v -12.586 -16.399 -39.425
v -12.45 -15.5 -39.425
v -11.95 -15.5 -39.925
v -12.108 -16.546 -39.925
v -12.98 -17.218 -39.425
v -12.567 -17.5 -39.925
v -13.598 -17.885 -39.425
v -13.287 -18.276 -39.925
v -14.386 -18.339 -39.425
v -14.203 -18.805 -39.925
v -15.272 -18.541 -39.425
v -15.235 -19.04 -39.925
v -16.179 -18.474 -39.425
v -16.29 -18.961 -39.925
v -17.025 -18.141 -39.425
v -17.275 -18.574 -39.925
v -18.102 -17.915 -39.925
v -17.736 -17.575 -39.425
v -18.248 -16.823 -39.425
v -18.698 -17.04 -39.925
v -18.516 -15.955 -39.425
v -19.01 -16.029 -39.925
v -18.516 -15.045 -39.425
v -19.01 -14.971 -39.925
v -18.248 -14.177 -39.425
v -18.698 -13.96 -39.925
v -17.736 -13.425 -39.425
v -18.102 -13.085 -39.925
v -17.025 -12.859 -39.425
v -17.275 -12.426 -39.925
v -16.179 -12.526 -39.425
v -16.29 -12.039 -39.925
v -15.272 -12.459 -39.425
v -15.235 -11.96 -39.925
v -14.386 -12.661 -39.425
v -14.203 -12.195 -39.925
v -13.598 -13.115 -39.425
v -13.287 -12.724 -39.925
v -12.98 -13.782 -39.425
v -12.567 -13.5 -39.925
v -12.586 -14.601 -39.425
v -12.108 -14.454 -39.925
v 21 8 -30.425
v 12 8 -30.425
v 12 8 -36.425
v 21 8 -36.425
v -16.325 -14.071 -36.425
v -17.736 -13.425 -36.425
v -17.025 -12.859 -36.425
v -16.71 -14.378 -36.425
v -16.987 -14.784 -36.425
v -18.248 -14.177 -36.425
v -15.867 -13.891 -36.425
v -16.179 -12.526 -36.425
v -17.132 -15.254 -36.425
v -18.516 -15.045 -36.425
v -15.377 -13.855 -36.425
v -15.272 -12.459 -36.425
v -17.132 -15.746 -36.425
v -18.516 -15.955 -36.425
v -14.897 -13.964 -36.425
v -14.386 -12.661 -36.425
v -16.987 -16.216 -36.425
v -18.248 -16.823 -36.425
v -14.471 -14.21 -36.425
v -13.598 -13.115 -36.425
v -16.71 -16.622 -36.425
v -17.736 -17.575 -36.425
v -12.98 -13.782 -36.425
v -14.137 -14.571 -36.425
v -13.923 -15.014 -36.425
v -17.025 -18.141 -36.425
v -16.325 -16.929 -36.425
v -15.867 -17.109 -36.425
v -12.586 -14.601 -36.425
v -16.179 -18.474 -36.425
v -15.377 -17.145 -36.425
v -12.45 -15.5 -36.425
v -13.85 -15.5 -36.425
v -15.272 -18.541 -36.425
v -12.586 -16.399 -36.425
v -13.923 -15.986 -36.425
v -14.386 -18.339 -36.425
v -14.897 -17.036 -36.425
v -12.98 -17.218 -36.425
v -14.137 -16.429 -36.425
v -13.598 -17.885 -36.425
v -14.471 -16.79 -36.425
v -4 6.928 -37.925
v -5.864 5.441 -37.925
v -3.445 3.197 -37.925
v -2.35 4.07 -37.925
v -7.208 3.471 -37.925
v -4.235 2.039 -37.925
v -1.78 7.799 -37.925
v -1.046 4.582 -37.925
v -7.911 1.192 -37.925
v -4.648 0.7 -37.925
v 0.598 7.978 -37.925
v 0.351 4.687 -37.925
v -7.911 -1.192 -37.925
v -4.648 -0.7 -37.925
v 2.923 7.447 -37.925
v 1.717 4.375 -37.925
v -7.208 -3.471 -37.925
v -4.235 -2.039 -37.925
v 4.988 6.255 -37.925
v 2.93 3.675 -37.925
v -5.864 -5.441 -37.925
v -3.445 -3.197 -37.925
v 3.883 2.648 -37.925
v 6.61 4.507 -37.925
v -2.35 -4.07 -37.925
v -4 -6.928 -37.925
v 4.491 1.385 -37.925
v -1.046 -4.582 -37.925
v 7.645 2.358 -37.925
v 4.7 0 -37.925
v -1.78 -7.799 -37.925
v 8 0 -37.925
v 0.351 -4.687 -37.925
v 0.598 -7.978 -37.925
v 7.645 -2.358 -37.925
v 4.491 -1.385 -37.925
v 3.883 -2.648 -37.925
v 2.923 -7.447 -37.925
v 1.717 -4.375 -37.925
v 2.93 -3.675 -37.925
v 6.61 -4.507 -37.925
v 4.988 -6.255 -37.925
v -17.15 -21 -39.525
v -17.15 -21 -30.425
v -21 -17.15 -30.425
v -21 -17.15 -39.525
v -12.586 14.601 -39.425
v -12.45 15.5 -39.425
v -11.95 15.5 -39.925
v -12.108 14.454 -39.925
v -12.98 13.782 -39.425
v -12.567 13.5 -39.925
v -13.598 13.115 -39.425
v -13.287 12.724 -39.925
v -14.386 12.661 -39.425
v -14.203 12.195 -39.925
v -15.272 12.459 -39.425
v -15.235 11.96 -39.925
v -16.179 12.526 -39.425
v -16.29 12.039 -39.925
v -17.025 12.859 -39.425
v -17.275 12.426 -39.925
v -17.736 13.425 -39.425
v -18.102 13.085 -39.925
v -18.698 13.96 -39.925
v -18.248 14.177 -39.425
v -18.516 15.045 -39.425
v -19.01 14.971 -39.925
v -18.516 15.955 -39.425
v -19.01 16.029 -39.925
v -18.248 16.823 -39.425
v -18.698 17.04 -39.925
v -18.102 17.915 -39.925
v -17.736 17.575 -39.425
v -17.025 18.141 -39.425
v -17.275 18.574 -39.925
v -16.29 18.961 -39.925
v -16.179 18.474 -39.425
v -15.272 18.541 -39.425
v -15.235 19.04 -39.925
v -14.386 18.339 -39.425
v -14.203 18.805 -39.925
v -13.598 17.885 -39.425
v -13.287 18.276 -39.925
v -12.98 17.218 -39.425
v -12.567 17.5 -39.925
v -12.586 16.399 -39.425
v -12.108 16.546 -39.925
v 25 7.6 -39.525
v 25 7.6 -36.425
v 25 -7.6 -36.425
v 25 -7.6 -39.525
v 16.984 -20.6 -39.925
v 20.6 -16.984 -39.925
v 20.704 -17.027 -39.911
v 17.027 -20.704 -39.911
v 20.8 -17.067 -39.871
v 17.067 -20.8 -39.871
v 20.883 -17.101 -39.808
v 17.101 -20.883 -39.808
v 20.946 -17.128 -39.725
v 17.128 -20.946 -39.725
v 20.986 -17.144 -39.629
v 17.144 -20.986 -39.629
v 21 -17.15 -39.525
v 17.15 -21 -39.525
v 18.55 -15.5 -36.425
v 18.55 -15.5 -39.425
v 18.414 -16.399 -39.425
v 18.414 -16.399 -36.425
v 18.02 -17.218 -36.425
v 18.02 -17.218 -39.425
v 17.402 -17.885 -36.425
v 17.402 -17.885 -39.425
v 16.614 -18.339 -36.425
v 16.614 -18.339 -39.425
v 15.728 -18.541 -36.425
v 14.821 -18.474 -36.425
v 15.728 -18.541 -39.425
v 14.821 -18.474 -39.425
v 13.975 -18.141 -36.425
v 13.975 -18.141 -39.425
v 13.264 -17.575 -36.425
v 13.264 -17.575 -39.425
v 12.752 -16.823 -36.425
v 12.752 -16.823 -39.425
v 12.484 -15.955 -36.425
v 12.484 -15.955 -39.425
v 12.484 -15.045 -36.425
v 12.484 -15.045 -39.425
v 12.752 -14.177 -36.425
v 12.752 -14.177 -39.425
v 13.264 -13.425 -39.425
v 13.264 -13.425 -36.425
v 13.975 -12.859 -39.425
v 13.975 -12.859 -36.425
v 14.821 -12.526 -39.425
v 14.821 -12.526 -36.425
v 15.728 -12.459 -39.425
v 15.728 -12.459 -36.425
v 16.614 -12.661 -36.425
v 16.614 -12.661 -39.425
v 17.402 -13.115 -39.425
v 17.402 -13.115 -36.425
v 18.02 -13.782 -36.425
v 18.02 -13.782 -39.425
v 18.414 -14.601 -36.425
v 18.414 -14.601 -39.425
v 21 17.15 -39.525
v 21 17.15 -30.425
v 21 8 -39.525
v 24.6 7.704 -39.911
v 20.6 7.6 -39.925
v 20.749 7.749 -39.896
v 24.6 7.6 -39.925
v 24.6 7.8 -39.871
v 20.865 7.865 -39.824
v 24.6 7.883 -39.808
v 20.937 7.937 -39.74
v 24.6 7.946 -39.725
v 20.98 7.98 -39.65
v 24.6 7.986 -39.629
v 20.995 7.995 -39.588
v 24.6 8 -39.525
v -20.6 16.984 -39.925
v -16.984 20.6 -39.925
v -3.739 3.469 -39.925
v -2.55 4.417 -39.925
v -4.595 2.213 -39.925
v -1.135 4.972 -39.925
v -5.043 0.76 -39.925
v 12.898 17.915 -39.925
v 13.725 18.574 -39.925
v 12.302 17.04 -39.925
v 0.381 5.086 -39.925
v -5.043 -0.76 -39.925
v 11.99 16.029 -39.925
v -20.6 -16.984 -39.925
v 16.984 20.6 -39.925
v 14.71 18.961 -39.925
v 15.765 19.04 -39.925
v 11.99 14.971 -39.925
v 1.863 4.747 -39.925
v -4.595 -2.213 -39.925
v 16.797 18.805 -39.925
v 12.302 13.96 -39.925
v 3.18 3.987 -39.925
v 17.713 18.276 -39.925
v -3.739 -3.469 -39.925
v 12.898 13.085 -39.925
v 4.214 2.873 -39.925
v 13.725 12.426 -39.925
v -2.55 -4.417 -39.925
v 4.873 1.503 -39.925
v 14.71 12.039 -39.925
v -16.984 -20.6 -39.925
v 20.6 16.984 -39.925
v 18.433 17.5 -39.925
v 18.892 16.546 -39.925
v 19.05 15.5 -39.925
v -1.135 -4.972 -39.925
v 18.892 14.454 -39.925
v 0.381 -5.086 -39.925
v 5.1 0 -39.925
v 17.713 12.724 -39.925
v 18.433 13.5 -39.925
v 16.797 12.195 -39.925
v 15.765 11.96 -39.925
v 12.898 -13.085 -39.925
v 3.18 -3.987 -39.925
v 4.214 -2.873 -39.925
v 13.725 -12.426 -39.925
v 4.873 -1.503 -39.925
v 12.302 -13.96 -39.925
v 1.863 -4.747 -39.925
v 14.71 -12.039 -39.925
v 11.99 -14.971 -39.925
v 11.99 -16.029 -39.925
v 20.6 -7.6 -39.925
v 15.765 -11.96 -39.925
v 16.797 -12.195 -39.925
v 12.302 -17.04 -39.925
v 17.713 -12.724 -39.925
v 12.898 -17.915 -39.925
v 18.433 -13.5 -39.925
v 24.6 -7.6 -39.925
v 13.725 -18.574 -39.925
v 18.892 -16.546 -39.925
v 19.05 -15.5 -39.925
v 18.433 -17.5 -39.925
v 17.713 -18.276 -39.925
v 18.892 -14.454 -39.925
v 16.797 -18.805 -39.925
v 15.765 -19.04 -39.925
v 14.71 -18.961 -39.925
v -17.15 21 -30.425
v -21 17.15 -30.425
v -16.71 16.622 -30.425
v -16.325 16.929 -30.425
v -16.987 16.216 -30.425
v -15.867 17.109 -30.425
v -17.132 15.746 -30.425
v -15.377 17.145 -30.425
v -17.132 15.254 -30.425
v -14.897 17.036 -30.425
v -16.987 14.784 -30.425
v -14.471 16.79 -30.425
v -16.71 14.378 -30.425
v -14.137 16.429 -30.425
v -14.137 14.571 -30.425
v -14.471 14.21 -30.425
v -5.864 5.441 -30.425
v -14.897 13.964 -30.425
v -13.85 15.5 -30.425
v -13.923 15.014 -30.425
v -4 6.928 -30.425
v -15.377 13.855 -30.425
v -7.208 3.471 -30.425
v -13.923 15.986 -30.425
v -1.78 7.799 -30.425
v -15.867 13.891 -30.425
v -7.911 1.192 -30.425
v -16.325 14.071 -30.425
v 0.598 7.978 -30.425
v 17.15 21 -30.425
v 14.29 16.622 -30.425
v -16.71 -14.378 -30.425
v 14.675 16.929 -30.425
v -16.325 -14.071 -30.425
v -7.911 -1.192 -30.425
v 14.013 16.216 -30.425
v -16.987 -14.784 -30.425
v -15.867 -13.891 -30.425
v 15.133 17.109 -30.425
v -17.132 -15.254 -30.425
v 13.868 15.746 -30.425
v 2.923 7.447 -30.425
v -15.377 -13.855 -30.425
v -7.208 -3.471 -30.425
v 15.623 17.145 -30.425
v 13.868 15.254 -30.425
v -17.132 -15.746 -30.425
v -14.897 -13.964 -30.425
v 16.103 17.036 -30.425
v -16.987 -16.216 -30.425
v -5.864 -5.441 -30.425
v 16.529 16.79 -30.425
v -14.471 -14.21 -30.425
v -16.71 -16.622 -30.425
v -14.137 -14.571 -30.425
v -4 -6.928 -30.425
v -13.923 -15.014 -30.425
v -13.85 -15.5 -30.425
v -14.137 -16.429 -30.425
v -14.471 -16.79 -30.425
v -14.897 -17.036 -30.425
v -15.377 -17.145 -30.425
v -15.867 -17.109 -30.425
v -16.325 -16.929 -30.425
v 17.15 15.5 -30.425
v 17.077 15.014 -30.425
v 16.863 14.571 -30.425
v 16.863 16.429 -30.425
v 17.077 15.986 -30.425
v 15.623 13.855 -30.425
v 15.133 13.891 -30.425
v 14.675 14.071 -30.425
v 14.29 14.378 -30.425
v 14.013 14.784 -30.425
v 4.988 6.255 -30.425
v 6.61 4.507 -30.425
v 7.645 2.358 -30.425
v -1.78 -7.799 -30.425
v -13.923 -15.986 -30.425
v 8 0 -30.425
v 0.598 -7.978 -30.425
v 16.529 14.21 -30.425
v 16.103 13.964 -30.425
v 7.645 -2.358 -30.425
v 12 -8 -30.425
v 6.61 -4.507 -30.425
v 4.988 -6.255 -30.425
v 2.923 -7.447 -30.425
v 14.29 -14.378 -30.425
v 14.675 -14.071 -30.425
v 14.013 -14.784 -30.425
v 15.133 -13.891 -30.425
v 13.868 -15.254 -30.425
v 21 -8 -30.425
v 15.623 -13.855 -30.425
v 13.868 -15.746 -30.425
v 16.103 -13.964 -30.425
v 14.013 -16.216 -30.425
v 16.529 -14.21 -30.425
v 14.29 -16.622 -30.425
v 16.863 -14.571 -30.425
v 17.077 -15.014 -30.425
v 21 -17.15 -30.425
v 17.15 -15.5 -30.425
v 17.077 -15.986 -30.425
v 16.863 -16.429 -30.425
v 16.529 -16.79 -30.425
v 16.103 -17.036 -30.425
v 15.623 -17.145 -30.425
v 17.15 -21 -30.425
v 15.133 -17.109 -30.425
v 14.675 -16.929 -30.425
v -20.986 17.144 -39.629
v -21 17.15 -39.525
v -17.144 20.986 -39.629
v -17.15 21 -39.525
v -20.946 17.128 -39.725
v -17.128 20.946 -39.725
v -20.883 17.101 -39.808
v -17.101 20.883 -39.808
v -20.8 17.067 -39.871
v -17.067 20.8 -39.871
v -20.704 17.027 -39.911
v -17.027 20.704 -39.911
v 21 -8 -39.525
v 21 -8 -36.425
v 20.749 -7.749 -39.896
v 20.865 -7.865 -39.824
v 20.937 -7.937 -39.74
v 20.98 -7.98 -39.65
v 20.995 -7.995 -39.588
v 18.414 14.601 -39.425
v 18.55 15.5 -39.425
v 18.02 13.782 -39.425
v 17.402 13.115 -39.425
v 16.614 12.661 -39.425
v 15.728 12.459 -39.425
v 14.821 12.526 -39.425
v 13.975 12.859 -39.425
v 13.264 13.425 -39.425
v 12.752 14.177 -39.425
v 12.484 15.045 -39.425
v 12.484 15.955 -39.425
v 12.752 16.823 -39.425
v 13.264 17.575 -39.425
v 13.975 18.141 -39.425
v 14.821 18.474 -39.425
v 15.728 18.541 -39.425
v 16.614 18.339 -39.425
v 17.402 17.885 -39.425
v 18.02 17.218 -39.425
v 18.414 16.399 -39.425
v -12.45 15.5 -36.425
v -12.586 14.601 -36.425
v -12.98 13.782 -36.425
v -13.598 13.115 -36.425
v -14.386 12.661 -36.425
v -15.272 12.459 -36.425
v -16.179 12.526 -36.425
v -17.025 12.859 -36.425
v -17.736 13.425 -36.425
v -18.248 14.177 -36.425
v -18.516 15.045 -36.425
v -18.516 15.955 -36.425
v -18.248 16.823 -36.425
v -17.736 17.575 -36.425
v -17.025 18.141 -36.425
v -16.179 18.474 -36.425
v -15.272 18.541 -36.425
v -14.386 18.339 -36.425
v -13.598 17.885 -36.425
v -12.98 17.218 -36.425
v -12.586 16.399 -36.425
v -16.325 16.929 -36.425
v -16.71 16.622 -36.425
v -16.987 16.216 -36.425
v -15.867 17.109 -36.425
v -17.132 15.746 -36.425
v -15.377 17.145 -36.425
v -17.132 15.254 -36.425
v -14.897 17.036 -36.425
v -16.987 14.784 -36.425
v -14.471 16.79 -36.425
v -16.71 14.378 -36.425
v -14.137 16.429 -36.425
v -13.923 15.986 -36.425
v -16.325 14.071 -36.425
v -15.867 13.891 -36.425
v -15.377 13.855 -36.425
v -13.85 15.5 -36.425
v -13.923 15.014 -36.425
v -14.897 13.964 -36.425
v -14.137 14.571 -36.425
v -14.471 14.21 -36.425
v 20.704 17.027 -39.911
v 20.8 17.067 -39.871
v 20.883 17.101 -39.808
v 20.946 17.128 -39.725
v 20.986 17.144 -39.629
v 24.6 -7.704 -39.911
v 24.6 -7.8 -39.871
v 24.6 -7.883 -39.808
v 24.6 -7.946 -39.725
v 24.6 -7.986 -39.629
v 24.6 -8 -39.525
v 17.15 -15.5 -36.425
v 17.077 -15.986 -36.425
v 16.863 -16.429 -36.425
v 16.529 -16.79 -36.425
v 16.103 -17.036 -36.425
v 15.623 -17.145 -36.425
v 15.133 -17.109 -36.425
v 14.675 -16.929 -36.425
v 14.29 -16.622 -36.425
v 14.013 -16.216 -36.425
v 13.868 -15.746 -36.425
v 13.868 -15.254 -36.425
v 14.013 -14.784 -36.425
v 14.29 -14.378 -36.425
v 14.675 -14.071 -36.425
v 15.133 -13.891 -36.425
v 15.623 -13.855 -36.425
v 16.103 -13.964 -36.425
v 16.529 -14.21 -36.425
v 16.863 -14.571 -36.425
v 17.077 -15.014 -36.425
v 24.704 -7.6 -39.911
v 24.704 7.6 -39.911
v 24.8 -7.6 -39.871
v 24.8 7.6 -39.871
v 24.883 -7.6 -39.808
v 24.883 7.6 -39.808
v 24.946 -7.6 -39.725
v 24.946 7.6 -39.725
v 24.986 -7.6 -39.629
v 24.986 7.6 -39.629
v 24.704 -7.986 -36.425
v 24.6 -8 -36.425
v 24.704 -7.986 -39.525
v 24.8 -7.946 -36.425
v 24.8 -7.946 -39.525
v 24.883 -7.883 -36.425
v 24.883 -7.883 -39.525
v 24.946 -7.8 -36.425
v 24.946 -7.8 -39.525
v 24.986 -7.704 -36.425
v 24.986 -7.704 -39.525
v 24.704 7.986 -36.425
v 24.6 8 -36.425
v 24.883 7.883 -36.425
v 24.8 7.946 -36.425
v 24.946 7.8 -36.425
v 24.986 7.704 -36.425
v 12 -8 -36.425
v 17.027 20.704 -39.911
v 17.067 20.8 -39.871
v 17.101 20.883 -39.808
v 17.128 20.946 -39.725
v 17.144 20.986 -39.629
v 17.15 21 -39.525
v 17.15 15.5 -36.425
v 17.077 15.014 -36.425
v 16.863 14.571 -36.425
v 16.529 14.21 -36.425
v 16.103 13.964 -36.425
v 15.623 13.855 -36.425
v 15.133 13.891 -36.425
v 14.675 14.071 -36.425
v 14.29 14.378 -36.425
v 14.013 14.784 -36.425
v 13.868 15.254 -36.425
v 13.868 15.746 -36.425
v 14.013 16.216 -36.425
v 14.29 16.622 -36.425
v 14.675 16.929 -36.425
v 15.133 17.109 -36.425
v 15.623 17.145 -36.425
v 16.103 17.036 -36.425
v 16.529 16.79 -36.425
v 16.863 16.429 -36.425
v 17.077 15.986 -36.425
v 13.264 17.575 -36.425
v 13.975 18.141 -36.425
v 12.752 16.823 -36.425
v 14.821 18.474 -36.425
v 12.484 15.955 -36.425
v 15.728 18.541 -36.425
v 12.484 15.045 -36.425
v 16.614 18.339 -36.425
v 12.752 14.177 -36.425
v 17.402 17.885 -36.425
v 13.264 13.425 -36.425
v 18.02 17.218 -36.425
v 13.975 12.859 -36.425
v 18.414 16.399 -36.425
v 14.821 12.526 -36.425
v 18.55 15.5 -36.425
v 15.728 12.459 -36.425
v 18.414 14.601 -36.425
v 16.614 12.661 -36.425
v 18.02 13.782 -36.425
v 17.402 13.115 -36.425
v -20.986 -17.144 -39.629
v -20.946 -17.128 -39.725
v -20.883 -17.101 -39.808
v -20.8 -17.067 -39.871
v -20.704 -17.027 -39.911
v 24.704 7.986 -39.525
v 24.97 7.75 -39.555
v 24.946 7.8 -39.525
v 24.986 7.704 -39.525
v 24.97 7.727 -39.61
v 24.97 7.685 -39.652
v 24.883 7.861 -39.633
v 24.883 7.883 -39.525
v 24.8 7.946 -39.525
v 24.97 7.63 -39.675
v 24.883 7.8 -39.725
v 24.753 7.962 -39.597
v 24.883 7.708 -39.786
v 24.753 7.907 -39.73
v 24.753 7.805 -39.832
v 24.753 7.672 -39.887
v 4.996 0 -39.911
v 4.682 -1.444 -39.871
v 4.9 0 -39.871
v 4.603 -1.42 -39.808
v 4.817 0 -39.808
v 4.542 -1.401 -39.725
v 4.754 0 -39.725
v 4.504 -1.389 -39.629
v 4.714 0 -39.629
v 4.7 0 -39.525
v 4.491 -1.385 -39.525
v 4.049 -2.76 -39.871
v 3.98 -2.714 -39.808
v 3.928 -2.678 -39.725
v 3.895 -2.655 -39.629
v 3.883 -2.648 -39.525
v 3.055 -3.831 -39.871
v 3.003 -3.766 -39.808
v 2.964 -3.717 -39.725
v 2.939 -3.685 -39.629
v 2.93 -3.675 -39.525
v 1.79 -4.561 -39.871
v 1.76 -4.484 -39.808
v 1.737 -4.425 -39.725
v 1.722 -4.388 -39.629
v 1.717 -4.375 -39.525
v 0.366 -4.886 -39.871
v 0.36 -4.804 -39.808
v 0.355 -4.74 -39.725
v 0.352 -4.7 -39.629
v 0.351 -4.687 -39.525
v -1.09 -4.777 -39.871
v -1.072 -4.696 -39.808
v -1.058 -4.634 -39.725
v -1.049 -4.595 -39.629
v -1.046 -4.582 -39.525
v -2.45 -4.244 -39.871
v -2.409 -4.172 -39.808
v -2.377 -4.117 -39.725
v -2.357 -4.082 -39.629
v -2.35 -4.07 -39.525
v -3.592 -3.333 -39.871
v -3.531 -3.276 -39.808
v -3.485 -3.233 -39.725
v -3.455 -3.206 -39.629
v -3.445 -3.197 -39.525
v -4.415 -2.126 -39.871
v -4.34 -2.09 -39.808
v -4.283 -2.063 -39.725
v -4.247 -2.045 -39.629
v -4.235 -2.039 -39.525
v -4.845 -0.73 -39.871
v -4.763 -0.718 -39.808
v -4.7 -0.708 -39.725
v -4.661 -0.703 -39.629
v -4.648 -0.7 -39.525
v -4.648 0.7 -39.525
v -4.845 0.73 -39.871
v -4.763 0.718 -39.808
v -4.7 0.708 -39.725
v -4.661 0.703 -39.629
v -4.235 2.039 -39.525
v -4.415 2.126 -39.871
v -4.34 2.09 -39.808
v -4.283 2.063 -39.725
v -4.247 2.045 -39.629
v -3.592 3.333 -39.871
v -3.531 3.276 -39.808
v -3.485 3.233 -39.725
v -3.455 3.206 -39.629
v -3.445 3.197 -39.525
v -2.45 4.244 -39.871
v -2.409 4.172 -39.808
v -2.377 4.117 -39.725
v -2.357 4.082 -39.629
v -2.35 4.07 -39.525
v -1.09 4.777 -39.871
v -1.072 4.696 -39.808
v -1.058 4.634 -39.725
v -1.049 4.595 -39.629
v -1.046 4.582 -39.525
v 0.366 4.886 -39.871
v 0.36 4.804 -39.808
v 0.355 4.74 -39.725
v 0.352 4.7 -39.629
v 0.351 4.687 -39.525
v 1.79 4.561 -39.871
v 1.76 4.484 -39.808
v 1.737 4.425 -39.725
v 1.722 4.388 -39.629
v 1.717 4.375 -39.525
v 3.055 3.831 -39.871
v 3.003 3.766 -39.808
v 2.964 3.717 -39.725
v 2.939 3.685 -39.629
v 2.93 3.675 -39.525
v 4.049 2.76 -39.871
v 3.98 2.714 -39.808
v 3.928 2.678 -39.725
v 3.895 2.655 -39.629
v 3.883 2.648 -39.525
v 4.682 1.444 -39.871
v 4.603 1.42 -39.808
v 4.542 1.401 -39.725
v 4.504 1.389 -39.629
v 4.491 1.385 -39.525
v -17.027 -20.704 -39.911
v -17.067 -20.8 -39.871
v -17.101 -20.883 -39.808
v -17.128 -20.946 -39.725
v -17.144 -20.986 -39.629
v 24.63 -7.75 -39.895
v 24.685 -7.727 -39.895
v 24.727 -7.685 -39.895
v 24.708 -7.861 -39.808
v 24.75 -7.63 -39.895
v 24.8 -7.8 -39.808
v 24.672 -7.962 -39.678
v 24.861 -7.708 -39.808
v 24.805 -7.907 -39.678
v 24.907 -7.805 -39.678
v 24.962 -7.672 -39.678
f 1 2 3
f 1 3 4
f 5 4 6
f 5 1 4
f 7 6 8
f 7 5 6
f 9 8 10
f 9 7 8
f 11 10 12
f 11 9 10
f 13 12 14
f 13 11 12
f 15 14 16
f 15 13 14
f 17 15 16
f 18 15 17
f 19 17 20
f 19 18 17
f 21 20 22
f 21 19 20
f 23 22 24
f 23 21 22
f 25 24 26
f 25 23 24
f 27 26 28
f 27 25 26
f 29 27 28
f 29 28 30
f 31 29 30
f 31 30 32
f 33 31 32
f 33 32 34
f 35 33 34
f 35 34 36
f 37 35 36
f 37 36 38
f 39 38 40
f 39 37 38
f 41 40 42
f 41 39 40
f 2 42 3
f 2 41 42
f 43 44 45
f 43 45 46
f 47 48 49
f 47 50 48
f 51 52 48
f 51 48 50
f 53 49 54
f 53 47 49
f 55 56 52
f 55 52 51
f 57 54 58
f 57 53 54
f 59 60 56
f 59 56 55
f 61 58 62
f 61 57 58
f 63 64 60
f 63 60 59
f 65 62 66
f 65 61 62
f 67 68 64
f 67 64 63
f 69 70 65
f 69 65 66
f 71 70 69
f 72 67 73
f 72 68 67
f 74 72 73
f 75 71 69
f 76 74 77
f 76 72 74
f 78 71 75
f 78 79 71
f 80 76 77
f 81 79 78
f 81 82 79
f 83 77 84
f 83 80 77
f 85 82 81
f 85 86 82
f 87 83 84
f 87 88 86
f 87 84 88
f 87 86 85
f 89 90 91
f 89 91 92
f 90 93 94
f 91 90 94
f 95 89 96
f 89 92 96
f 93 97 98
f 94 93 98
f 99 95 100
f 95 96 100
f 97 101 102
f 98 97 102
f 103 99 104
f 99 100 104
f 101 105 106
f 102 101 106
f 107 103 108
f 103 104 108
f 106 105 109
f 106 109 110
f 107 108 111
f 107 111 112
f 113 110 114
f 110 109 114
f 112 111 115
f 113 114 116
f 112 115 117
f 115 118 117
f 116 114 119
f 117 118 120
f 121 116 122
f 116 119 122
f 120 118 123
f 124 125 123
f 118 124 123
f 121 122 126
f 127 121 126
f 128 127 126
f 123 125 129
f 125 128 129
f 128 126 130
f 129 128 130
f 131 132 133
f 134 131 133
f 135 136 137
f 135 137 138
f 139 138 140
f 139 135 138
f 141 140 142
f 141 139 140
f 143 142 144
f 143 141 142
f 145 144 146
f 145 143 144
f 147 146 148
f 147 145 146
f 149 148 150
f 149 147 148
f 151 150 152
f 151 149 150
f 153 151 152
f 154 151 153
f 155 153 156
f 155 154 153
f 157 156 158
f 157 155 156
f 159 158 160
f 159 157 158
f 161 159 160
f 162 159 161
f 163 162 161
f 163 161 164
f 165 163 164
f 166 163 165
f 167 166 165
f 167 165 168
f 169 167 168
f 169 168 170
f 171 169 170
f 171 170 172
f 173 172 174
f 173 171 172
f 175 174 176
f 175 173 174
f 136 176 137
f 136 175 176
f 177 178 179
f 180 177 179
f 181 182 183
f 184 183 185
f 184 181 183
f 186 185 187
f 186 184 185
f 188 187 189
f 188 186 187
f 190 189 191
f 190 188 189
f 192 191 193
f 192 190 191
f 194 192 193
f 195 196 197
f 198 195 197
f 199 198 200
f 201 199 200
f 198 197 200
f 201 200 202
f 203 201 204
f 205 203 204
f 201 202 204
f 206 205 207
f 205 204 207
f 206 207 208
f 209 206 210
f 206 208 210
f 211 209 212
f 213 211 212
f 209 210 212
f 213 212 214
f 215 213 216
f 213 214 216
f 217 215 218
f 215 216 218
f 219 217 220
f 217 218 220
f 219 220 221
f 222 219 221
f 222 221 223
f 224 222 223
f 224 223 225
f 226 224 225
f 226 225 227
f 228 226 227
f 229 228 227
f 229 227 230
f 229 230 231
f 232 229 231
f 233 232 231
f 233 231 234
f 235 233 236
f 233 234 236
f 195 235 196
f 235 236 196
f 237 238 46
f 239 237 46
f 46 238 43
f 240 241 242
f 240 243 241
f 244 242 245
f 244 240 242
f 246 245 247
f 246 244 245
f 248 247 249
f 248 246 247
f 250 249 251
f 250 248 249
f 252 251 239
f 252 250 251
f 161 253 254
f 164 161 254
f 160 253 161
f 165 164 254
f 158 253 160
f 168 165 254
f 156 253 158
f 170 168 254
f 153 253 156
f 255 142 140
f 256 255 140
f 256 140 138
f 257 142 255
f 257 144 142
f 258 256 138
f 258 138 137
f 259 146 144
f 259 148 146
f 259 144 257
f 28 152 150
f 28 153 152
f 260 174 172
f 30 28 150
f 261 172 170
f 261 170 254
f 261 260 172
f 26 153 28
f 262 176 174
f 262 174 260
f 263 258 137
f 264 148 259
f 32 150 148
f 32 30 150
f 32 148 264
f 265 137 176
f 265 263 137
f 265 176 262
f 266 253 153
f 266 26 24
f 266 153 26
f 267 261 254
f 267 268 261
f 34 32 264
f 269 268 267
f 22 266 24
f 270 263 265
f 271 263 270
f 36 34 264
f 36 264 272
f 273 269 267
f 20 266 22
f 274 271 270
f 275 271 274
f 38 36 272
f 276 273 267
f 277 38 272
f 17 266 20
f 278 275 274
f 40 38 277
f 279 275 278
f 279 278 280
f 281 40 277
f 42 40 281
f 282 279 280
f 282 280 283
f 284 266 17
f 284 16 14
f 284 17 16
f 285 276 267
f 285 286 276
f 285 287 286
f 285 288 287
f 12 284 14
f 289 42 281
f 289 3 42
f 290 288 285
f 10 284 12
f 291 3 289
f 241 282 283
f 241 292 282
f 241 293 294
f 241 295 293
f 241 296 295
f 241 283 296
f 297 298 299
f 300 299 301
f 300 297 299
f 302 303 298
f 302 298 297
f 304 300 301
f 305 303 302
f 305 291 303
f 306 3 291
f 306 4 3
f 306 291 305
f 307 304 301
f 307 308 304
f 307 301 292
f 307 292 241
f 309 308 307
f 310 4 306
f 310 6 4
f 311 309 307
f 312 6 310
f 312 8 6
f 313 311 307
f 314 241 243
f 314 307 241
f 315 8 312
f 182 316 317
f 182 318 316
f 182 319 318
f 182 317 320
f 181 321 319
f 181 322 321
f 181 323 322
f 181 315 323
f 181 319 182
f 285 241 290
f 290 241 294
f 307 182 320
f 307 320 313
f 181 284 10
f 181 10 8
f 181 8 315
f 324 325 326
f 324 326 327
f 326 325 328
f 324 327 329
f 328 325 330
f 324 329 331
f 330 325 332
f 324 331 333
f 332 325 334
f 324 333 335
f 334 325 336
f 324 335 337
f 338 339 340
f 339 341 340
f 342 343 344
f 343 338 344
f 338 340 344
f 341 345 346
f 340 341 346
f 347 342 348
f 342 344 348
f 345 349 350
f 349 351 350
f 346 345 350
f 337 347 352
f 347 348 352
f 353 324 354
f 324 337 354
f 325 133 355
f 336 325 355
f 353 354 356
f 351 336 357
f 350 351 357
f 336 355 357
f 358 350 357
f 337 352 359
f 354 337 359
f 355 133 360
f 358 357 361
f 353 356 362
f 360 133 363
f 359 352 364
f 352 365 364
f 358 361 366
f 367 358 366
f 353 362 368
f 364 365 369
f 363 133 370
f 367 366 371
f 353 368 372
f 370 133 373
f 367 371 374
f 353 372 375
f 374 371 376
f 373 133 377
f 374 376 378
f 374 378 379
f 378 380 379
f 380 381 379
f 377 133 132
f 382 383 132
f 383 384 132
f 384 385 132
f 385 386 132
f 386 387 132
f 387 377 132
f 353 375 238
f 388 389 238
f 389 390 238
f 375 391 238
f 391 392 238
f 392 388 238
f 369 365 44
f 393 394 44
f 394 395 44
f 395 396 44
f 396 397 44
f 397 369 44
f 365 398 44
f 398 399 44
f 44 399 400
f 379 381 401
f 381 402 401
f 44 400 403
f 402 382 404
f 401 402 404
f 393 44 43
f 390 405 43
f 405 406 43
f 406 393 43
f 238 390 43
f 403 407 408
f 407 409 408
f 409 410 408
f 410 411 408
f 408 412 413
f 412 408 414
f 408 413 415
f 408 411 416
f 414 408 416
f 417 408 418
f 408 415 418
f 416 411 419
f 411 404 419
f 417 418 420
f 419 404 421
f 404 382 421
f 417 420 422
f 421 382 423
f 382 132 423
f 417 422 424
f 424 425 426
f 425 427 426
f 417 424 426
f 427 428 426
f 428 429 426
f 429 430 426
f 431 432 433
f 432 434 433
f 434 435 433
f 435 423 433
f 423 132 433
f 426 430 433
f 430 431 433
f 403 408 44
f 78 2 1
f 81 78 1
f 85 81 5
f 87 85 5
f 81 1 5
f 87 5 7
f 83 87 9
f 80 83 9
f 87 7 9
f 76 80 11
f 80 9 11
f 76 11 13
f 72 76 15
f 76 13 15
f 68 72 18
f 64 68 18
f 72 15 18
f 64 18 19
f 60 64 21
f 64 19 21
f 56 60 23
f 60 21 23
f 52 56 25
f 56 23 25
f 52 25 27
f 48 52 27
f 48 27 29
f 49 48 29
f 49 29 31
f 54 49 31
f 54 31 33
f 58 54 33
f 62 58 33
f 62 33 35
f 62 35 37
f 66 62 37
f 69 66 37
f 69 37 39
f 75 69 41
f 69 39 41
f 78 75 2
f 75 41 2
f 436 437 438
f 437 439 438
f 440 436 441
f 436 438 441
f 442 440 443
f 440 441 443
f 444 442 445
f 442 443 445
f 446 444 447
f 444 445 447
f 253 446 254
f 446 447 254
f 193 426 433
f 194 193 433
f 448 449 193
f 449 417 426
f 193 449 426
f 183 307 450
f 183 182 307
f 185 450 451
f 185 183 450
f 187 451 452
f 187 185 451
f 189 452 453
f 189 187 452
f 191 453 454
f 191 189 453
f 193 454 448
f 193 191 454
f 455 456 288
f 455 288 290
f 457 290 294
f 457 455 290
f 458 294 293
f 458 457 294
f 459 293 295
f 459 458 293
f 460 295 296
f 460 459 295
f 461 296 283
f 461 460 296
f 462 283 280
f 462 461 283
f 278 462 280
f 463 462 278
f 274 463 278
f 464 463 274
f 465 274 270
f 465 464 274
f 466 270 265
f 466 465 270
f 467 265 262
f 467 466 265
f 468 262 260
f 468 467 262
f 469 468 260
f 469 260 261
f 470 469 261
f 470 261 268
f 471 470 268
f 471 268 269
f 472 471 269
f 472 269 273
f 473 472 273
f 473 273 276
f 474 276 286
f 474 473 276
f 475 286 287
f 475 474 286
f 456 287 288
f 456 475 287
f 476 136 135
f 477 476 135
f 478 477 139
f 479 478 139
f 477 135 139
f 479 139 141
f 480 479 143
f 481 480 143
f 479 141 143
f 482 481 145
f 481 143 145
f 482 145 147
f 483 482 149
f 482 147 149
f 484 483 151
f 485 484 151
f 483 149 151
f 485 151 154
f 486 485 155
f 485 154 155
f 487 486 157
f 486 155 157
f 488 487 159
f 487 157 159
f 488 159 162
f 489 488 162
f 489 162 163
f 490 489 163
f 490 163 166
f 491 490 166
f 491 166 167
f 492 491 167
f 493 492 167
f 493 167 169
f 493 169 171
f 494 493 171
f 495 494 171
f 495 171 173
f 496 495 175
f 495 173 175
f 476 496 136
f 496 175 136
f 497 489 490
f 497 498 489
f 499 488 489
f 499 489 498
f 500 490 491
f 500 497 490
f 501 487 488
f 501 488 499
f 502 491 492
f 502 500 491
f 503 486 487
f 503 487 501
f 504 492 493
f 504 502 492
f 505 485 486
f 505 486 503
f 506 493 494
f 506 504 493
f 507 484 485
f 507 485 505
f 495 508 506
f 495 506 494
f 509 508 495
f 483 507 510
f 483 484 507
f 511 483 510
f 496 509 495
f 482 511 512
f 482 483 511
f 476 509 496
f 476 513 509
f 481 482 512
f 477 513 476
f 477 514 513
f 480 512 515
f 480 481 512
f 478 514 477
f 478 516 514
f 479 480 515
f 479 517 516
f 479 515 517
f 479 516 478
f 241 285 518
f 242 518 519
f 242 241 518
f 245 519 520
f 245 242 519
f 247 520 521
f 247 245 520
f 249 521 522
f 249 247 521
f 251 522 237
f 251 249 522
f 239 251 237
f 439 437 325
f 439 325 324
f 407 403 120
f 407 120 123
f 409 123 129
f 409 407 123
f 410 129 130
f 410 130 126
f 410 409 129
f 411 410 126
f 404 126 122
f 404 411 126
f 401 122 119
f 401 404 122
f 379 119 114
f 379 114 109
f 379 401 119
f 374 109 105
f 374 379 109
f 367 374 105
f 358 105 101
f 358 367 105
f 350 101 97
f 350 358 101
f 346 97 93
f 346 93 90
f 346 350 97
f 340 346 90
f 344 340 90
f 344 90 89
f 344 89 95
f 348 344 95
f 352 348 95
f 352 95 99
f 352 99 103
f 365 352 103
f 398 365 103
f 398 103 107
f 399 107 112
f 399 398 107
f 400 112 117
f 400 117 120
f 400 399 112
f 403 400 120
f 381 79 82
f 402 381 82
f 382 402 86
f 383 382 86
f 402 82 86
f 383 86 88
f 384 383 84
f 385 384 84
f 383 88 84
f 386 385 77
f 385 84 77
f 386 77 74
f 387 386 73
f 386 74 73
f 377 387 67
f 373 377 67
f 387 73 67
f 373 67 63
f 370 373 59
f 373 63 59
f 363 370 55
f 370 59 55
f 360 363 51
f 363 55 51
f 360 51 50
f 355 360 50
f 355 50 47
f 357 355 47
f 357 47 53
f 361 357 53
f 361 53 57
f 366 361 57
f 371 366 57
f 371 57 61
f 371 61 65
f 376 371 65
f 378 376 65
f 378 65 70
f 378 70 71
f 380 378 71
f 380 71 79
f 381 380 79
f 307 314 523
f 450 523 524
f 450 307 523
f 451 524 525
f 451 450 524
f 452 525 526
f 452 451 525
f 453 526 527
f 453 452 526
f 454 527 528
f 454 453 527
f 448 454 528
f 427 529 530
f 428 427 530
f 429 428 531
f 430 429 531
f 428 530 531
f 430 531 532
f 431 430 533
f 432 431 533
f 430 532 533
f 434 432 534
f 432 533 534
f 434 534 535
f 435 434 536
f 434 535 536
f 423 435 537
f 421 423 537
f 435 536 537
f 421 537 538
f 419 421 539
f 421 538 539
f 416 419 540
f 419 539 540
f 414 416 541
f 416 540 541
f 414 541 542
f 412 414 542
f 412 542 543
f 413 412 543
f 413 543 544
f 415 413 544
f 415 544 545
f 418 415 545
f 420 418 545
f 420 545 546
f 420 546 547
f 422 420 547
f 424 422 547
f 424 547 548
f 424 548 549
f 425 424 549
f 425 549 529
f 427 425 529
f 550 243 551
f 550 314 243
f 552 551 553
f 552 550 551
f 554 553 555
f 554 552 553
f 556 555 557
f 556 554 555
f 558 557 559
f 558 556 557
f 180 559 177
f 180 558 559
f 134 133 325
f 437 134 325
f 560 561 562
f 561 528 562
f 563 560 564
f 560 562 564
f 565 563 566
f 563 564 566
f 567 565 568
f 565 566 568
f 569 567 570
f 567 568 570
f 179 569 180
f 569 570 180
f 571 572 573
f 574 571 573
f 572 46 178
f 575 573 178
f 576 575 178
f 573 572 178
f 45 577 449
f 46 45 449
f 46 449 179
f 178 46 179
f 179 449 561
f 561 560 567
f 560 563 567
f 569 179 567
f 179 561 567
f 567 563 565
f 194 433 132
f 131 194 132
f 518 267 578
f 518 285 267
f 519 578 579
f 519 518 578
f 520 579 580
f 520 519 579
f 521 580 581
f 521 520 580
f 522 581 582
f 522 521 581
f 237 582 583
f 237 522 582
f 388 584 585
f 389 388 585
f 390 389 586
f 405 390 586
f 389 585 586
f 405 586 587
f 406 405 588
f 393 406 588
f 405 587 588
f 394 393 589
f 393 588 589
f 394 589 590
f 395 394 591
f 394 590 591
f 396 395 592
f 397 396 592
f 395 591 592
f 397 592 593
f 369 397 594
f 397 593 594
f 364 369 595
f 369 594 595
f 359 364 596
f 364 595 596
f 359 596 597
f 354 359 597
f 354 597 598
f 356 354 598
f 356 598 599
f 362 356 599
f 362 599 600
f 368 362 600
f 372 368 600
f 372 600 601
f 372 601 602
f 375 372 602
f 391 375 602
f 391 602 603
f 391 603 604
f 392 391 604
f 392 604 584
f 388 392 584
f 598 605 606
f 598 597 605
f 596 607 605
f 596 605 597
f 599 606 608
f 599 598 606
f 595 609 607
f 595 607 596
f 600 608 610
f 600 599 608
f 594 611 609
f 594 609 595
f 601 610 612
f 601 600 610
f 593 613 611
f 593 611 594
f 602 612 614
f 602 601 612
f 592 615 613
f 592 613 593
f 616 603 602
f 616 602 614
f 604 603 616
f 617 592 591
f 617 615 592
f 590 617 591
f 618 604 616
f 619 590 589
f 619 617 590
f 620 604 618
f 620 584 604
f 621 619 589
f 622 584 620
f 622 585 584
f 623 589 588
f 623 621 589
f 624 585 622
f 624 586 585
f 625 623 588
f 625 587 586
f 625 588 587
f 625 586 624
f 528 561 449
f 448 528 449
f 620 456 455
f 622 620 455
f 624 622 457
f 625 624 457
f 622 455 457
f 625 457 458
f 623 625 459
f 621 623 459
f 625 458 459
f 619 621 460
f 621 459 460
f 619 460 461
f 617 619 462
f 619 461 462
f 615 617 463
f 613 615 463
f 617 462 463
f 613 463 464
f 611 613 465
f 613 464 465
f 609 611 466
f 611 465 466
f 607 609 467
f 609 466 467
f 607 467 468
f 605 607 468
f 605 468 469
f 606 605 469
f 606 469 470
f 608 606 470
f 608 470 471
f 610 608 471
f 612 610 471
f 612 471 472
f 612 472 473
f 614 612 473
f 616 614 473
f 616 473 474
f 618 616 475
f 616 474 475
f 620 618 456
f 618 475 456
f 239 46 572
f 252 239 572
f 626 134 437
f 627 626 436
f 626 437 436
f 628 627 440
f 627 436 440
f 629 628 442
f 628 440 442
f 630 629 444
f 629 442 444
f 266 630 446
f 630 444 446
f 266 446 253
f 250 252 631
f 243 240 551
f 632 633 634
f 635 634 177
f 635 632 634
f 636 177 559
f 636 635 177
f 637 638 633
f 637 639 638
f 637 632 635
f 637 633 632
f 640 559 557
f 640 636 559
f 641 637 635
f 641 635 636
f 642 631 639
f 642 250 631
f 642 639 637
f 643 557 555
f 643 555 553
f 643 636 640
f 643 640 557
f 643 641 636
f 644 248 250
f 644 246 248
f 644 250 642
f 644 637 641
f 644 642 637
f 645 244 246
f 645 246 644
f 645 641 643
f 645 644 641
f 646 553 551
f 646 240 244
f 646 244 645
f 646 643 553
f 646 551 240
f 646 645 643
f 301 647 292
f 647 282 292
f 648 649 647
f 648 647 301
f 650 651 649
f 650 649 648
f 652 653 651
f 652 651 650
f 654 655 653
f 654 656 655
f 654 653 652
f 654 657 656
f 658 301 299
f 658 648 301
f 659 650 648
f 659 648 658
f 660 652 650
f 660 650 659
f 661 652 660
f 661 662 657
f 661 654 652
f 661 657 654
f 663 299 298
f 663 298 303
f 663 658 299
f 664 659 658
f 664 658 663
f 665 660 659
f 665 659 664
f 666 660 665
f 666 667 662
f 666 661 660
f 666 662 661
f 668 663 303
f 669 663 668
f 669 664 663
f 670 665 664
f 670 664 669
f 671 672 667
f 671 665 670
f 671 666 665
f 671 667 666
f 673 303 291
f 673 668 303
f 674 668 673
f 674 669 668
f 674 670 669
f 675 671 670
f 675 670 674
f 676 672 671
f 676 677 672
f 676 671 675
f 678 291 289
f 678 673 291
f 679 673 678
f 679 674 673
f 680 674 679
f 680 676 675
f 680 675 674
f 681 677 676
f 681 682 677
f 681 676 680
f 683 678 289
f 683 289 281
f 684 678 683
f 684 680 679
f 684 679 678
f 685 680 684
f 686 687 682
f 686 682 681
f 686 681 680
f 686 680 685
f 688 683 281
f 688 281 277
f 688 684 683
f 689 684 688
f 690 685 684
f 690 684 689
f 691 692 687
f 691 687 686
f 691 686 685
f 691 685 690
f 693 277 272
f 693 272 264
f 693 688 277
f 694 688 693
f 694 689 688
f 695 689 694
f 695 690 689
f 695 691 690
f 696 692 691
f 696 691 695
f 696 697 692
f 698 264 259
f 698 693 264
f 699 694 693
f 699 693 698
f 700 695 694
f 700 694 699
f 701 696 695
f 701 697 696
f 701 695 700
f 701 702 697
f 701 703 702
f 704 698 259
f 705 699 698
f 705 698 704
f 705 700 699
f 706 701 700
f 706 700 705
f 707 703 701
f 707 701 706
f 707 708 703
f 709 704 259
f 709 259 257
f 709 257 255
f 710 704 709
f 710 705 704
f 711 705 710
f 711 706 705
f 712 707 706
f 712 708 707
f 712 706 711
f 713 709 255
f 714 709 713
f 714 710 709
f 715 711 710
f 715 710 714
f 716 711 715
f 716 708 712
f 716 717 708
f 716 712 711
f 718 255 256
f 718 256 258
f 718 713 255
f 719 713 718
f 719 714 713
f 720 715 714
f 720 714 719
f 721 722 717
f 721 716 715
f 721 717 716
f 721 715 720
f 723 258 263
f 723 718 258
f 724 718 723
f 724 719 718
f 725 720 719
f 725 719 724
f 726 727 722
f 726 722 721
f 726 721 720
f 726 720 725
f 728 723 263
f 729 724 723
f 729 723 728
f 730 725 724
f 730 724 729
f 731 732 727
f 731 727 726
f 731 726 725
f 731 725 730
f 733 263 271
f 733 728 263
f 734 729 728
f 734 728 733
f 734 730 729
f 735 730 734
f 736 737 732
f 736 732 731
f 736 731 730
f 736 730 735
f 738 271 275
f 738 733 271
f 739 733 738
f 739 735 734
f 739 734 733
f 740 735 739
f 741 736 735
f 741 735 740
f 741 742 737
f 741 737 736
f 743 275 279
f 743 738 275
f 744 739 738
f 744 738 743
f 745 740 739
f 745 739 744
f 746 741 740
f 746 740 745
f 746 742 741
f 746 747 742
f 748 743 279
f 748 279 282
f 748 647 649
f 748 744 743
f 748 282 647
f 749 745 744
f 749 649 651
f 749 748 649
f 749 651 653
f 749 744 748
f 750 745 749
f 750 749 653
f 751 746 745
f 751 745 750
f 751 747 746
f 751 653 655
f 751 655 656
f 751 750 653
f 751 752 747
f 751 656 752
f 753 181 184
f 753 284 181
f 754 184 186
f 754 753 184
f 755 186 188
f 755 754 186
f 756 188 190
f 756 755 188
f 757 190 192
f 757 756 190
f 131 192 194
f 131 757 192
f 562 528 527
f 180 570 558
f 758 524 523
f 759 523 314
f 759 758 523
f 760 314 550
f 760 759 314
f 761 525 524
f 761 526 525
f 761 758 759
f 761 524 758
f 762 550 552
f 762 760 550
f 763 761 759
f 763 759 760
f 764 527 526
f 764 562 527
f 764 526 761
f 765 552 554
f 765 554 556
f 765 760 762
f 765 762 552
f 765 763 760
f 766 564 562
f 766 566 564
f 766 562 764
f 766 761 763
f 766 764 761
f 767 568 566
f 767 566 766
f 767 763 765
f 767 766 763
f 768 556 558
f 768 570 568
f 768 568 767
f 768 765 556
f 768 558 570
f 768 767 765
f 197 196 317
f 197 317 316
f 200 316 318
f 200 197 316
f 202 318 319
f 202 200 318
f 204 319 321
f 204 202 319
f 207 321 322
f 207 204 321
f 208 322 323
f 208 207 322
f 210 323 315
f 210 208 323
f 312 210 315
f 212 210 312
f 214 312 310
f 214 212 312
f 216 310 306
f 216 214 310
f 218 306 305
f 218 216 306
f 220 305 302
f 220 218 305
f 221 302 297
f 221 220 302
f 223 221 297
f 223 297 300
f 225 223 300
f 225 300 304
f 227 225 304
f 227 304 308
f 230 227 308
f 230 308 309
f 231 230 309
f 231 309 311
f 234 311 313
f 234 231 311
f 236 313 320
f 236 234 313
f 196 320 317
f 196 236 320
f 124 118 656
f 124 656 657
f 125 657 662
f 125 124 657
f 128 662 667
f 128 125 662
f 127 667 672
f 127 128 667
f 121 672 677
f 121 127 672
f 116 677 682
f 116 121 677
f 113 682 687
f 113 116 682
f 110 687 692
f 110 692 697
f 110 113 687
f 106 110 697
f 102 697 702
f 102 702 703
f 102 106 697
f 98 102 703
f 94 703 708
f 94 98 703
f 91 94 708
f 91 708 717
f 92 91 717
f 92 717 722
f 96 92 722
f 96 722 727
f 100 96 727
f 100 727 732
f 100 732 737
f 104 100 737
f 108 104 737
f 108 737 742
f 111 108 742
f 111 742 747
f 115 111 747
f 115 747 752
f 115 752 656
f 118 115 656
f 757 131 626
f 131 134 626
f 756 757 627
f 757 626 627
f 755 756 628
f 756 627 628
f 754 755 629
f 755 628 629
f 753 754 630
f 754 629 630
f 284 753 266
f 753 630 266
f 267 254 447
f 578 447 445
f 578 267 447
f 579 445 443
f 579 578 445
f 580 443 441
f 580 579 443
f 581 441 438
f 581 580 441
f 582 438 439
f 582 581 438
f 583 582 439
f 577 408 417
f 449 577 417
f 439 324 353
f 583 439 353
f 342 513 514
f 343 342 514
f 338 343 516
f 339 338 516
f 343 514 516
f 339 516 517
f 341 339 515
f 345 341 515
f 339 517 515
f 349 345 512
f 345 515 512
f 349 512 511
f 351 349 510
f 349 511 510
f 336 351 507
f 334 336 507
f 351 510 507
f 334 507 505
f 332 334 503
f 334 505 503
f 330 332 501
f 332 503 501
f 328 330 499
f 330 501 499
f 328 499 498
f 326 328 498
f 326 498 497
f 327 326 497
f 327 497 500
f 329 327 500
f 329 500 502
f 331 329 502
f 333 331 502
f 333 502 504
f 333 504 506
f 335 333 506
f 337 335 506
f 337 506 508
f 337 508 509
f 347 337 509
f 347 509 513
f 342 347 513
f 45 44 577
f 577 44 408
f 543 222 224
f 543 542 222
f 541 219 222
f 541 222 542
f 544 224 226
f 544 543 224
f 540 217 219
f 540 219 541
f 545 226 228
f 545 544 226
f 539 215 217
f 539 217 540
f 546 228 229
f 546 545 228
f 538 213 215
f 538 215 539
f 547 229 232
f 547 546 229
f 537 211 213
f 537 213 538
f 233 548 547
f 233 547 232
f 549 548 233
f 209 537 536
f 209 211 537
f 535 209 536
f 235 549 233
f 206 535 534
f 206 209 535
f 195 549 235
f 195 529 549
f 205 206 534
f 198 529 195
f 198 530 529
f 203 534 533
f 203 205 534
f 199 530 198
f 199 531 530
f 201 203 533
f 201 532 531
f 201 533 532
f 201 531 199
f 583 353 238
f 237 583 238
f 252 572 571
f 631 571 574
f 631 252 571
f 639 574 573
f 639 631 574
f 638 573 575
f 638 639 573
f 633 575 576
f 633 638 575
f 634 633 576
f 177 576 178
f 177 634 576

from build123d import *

# Parameters (mm, degrees)
SKETCH006_R             = 4.7
PAD003_DEPTH            = 9.5
SKETCH007_W             = 12.9999948434
SKETCH007_H             = 16
POCKET002_DEPTH         = 6
SKETCH008_R             = 8
POCKET003_DEPTH         = 7.5
SKETCH009_R             = 1.65
POCKET004_DEPTH         = 9.501
SKETCH010_R             = 3.05
POCKET005_DEPTH         = 3.5
FILLET_R                = 0.4
CHAMFER001_SIZE         = 0.5
BODY002_PLACEMENT_ANGLE = 180


with BuildPart() as part:
    # Sketch006 → Pad003 (new body)
    with BuildSketch(Plane.XY):
        Polygon((-21.0000051566, 17.1500051566), (-21.0000051566, -17.1500051566), (-17.1500154699, -21.0000051566), (17.1500154699, -21.0000051566), (20.9999948434, -17.1499948434), (20.9999948434, -8), (24.9999948434, -8), (24.9999948434, 8), (20.9999948434, 8), (20.9999948434, 17.1499948434), (17.1500051566, 20.9999948434), (-17.1500051566, 20.9999948434), align=None)
        Circle(SKETCH006_R, mode=Mode.SUBTRACT)
    extrude(amount=PAD003_DEPTH)

    # Sketch007 → Pocket002 (cut)
    with BuildSketch(Plane.XY):
        with Locations((18.4999974217, 0)):
            Rectangle(SKETCH007_W, SKETCH007_H)
    extrude(amount=POCKET002_DEPTH, mode=Mode.SUBTRACT)

    # Sketch008 → Pocket003 (cut)
    with BuildSketch(Plane.XY):
        Circle(SKETCH008_R)
    extrude(amount=POCKET003_DEPTH, mode=Mode.SUBTRACT)

    # Sketch009 → Pocket004 (cut, through all)
    with BuildSketch(Plane.XY.offset(9.5)):
        with Locations((-15.5, 15.5)):
            Circle(SKETCH009_R)
        with Locations((15.5, 15.5)):
            Circle(SKETCH009_R)
        with Locations((15.5, -15.5)):
            Circle(SKETCH009_R)
        with Locations((-15.5, -15.5)):
            Circle(SKETCH009_R)
    extrude(amount=-POCKET004_DEPTH, mode=Mode.SUBTRACT)

    # Sketch010 → Pocket005 (cut)
    with BuildSketch(Plane.XY.offset(9.5)):
        with Locations((-15.5, 15.5)):
            Circle(SKETCH010_R)
        with Locations((15.5, 15.5)):
            Circle(SKETCH010_R)
        with Locations((15.5, -15.5)):
            Circle(SKETCH010_R)
        with Locations((-15.5, -15.5)):
            Circle(SKETCH010_R)
    extrude(amount=-POCKET005_DEPTH, mode=Mode.SUBTRACT)

    # Fillet
    fillet_edges = [part.edges().sort_by_distance(p)[0] for p in [
        (-4.7, 0, 9.5),
        (0, -21.000005, 9.5),
        (19.075005, -19.075, 9.5),
        (20.999995, -12.574997, 9.5),
        (22.999995, -8, 9.5),
        (24.999995, -8, 7.75),
        (24.999995, 8, 7.75),
        (22.999995, 8, 9.5),
        (20.999995, 12.574997, 9.5),
        (19.075, 19.074995, 9.5),
        (0, 20.999995, 9.5),
        (-19.075005, 19.075, 9.5),
        (-21.000005, 0, 9.5),
        (-19.07501, -19.075005, 9.5),
        (24.999995, 0, 9.5),
    ]]
    fillet(fillet_edges, radius=FILLET_R)

    # Chamfer001
    chamfer001_edges = [part.edges().sort_by_distance(p)[0] for p in [
        (12.45, 15.5, 9.5),
        (-18.55, 15.5, 9.5),
        (12.45, -15.5, 9.5),
        (-18.55, -15.5, 9.5),
    ]]
    chamfer(chamfer001_edges, length=CHAMFER001_SIZE)


with BuildPart() as part_1:
    # Body002 placement: moved
    add(part.part.moved(Location((0, 0, -30.425))).rotate(Axis((0, 0, -30.425), (1, 0, 0)), BODY002_PLACEMENT_ANGLE))


solid = part_1.part
